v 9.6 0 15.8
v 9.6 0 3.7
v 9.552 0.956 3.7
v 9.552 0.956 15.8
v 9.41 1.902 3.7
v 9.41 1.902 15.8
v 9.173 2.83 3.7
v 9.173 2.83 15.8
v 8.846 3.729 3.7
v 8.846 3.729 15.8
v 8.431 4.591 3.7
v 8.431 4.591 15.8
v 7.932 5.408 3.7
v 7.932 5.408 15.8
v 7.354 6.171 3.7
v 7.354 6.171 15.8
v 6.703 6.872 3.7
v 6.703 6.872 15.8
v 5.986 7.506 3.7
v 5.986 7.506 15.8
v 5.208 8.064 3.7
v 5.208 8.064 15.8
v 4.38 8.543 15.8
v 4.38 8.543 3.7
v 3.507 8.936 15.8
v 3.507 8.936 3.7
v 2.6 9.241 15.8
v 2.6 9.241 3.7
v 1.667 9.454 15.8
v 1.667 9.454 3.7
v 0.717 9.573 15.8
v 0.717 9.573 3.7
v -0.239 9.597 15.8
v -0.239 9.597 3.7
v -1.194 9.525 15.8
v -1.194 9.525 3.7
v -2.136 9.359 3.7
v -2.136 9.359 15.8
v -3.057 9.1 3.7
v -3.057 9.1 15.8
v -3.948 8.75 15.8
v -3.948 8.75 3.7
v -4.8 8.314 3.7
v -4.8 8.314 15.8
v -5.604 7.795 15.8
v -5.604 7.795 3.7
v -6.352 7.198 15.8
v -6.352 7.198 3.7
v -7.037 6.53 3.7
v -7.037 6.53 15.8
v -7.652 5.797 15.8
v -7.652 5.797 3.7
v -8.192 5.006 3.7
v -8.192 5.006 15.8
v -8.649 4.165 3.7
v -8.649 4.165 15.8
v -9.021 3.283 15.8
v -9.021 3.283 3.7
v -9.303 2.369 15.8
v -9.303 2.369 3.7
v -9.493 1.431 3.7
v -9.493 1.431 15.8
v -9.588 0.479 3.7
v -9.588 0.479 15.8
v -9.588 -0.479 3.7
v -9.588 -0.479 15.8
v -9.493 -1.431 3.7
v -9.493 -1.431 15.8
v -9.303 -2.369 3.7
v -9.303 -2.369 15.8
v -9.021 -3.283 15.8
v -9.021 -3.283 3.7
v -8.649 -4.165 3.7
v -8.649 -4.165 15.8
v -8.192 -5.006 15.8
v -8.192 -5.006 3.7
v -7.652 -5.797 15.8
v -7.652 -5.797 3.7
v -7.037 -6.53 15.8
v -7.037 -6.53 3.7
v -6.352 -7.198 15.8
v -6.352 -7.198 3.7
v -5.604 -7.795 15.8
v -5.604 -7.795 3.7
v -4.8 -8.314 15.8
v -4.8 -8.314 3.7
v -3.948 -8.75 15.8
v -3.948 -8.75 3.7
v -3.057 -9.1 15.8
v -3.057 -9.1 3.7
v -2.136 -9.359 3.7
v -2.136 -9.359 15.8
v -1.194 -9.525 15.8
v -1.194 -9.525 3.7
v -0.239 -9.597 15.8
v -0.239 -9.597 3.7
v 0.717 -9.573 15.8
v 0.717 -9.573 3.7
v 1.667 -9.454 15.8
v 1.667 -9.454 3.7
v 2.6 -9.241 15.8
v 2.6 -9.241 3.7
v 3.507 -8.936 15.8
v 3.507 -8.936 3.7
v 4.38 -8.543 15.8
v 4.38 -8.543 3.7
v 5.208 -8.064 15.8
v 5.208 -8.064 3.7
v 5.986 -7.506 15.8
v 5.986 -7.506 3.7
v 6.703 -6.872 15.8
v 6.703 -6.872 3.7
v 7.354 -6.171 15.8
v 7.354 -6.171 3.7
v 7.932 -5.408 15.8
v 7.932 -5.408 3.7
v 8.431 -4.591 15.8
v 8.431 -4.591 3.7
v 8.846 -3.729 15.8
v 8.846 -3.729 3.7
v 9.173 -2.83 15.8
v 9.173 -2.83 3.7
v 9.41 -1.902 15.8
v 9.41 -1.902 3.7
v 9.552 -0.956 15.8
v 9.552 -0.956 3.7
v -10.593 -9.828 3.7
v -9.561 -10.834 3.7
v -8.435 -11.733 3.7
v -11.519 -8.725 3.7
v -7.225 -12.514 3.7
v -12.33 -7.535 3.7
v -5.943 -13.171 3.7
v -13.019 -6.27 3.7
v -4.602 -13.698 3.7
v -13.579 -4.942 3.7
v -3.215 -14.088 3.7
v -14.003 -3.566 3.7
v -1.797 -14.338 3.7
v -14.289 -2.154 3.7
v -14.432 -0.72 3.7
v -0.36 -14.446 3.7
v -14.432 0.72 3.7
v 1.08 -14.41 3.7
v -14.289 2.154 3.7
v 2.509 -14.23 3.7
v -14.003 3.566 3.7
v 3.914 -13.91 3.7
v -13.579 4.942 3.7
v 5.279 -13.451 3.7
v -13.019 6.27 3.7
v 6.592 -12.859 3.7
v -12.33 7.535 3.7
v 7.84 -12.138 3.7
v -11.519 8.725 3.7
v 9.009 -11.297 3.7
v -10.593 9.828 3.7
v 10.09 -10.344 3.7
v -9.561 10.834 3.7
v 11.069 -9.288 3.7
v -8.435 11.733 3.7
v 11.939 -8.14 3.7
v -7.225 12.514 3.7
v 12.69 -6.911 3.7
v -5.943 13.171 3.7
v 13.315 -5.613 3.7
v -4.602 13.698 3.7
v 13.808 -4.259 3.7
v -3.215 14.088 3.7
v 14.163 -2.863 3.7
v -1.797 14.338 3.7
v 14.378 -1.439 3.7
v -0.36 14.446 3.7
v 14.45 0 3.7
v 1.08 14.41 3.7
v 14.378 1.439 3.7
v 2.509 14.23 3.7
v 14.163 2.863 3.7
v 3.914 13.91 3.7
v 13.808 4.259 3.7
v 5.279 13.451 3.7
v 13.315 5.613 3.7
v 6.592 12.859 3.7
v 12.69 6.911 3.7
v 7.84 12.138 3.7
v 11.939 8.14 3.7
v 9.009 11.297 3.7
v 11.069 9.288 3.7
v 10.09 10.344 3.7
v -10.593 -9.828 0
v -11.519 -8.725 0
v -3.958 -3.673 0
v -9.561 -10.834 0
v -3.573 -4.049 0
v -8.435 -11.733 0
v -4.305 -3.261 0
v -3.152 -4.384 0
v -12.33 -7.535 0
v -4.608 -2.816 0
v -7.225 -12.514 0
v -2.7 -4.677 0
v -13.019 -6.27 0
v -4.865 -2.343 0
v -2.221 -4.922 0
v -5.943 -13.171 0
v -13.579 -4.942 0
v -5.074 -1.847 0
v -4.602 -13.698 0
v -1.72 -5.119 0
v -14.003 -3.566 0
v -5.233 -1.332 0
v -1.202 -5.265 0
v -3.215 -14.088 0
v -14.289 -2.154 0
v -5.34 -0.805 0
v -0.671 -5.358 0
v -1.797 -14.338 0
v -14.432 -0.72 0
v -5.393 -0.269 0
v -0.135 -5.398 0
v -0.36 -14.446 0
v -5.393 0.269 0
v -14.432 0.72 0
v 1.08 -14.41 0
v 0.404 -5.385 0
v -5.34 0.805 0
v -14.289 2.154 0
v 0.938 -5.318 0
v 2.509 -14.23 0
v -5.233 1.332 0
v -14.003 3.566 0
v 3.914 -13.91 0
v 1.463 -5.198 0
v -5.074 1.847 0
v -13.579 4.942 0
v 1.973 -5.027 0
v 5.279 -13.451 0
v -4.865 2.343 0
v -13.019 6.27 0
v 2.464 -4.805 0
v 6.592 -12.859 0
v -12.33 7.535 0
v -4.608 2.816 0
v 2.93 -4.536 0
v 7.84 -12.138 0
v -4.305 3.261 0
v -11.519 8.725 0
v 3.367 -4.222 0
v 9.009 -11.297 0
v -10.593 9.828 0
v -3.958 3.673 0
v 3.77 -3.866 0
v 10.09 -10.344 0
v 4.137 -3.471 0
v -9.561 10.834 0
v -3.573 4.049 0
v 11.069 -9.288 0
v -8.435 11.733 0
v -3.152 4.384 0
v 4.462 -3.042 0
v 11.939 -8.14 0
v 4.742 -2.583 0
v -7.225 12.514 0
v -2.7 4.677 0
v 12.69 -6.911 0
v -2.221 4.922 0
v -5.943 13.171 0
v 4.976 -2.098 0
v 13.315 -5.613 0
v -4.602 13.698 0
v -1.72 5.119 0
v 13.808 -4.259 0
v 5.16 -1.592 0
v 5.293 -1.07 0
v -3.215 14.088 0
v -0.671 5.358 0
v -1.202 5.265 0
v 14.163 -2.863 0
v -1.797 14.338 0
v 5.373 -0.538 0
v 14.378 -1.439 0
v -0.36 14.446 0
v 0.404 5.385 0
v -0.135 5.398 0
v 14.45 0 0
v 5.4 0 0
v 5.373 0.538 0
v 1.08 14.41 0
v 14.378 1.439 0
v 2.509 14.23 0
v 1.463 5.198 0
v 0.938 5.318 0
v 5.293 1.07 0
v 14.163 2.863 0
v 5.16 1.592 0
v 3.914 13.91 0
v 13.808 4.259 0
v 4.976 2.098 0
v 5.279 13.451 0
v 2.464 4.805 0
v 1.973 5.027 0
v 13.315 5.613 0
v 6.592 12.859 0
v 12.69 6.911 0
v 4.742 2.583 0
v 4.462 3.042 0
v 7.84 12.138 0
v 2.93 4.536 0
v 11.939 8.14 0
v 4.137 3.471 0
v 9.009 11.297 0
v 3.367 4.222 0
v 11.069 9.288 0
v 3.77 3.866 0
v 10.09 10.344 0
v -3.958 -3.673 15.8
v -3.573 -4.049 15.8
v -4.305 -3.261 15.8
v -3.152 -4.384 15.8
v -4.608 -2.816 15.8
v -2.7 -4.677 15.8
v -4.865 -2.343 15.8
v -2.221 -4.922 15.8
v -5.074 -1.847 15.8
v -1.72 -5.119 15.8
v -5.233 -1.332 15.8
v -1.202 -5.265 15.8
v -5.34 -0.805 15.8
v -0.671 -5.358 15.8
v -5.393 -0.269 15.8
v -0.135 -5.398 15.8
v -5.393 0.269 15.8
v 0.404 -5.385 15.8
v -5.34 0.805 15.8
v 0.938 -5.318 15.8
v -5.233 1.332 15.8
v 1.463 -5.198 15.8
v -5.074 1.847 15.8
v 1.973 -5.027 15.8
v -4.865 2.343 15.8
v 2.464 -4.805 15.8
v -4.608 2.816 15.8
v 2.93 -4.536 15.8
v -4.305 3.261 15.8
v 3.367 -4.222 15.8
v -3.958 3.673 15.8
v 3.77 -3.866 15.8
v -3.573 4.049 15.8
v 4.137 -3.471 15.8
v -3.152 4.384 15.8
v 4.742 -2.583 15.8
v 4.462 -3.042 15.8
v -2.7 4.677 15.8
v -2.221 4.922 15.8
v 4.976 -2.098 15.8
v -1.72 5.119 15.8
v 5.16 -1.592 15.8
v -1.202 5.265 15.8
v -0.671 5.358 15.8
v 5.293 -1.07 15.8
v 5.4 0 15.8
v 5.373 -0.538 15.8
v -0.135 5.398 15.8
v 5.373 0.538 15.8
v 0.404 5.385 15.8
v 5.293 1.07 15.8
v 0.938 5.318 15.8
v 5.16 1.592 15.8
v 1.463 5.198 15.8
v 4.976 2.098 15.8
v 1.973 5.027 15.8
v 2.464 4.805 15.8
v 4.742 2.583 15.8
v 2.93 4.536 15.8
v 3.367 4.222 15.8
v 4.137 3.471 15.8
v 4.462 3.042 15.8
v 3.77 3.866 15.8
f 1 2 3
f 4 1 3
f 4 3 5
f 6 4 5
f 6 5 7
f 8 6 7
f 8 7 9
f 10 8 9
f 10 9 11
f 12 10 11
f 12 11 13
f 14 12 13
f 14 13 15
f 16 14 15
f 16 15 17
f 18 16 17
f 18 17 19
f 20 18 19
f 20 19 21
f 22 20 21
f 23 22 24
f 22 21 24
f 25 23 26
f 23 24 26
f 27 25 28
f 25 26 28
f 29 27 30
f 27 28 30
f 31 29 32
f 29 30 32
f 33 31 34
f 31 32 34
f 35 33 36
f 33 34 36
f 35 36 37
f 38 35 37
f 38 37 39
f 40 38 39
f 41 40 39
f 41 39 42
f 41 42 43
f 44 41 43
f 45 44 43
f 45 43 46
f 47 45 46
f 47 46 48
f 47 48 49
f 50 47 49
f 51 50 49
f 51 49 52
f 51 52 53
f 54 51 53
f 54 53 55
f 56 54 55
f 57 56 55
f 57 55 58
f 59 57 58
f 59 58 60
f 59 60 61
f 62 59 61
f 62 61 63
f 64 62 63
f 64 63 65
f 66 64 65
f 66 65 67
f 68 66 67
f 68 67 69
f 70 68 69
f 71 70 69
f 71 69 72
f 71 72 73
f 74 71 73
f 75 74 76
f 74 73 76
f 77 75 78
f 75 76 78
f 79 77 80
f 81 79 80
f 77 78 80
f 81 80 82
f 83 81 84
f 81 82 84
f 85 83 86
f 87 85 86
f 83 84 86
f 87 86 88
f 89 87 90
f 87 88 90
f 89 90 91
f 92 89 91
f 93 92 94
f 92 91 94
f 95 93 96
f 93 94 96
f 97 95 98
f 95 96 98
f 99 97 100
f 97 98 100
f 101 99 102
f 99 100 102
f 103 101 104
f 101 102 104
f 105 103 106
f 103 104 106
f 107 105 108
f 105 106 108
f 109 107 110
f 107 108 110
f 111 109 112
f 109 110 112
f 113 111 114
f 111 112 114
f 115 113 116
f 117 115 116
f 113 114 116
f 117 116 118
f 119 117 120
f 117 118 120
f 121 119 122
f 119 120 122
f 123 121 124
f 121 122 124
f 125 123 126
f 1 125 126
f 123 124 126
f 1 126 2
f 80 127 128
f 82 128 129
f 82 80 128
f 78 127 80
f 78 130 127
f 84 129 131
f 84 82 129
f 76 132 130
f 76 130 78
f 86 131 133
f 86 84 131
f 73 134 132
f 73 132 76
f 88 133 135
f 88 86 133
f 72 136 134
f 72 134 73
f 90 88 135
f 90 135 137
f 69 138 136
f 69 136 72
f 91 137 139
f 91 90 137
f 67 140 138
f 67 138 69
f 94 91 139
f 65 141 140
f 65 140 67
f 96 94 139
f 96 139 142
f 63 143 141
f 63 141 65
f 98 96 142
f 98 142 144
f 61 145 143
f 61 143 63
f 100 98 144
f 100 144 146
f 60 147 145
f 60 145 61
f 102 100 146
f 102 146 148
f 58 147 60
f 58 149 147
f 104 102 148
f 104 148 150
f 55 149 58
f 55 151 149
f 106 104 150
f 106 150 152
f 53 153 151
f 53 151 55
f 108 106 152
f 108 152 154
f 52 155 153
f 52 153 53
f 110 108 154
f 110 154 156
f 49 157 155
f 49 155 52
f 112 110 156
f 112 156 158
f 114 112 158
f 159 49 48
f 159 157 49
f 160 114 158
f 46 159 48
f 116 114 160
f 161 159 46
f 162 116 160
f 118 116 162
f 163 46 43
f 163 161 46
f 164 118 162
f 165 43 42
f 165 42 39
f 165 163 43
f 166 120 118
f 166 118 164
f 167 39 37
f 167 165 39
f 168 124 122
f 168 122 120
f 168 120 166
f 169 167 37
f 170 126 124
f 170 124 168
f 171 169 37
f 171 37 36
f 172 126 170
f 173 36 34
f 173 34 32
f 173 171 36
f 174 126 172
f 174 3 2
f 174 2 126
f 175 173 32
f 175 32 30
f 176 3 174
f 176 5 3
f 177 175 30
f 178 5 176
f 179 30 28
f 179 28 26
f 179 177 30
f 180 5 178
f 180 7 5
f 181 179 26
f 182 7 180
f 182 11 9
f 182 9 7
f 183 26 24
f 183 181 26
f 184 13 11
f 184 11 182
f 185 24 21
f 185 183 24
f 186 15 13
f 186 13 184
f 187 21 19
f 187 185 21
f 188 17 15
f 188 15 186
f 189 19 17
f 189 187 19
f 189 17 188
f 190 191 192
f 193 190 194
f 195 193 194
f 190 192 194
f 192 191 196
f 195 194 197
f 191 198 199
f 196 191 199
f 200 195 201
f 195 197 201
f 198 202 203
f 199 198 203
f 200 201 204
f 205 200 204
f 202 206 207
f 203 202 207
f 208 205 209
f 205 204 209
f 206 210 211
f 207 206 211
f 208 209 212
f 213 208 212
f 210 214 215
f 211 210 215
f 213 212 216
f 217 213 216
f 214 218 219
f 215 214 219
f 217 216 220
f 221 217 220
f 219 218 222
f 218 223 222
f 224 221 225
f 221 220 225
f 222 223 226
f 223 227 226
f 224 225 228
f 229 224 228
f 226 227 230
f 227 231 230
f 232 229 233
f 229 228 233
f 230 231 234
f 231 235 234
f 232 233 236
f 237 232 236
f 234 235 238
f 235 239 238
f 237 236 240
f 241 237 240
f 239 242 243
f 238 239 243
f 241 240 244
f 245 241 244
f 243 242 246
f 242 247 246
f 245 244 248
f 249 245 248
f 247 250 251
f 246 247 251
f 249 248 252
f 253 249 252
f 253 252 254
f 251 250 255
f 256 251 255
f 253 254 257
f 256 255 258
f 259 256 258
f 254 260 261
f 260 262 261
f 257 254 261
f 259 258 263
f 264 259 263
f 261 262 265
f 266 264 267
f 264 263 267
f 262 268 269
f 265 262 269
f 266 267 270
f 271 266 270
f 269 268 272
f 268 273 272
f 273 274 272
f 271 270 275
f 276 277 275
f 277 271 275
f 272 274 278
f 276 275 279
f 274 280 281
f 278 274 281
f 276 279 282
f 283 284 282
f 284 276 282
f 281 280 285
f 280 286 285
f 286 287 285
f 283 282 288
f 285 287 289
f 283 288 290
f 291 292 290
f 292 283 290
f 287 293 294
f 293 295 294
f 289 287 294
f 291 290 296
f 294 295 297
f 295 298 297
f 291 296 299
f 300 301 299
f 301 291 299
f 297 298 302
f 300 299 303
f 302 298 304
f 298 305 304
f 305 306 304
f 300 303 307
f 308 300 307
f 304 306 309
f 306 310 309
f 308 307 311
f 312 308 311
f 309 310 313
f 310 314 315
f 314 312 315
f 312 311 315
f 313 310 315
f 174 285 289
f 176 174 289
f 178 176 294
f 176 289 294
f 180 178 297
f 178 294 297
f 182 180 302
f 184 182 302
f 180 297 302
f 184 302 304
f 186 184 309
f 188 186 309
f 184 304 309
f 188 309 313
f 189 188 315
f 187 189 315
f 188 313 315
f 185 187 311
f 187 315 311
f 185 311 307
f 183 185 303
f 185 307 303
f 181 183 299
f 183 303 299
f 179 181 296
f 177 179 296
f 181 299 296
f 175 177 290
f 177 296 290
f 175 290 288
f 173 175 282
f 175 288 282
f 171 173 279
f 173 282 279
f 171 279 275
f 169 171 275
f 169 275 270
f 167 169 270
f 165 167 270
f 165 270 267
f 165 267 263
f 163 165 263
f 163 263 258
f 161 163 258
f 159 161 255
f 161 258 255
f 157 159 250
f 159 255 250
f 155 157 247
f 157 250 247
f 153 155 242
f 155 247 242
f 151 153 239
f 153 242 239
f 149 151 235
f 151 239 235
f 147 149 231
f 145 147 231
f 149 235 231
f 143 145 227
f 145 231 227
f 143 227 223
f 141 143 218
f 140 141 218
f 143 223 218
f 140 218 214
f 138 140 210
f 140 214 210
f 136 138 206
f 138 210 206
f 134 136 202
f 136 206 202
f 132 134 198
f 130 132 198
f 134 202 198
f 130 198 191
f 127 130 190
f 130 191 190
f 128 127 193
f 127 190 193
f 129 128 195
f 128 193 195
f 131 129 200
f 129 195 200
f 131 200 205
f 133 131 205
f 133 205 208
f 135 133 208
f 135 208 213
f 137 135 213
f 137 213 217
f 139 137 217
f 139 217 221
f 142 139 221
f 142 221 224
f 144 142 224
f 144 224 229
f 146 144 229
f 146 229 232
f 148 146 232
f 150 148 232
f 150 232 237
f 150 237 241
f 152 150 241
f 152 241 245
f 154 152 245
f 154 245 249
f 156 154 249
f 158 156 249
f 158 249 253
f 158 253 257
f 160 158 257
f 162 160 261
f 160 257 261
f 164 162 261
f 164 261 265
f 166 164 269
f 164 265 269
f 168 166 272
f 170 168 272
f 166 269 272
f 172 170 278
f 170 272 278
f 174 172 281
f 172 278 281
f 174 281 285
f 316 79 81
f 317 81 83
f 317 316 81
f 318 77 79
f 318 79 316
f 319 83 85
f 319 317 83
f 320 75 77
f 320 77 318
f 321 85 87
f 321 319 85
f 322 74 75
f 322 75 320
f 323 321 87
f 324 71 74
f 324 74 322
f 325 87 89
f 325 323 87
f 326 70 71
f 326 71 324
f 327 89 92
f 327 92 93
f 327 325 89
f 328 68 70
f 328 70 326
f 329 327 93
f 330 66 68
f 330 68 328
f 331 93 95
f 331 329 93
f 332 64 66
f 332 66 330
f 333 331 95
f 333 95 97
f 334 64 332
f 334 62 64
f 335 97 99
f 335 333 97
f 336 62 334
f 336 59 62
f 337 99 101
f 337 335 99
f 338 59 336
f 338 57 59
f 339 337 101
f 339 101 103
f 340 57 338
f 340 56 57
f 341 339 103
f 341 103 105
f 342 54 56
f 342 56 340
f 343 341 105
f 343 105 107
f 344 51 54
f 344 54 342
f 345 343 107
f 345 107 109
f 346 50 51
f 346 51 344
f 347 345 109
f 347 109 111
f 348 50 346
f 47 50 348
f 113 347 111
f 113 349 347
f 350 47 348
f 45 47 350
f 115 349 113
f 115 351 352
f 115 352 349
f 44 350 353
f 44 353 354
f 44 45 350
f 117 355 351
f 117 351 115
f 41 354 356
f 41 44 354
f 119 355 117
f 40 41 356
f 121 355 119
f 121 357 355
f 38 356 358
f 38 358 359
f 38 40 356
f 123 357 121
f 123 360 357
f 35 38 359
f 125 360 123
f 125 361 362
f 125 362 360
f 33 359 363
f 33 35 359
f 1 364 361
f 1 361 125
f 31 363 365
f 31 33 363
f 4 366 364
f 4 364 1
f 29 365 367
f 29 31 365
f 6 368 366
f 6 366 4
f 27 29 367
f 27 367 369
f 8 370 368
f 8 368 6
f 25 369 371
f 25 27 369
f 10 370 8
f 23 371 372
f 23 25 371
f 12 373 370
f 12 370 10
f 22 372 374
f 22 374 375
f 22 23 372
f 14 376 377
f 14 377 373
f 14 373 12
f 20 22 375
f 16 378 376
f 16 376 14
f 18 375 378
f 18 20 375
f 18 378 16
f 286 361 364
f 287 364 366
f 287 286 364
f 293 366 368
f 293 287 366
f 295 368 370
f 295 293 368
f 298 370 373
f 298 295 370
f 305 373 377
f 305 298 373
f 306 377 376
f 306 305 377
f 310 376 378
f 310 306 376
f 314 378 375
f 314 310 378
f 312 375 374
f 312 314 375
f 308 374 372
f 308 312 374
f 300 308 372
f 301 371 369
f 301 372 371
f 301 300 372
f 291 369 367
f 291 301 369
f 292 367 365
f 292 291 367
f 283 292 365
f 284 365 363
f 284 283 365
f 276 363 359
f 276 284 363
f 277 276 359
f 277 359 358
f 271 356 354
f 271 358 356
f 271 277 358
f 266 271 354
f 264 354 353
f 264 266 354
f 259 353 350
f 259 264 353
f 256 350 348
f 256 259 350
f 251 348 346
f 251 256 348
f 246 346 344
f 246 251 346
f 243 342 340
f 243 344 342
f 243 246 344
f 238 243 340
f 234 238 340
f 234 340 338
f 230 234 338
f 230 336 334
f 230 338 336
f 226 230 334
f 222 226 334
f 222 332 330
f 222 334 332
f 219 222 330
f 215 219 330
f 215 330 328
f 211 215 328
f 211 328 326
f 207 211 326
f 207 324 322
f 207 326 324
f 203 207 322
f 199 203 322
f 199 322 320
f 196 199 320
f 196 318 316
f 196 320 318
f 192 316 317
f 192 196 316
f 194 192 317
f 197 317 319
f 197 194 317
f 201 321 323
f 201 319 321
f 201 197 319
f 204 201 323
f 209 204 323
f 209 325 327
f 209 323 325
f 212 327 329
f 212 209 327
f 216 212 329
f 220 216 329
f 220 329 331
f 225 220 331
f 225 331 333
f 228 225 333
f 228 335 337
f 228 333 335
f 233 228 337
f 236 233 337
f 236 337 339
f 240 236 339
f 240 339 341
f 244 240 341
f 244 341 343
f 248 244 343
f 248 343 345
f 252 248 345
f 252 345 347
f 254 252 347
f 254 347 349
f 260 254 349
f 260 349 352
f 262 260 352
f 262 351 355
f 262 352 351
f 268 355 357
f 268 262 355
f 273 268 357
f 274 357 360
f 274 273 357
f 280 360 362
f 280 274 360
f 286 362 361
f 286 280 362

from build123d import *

# Parameters (mm, degrees)
F0_R     = 9.6
F1_DEPTH = 15.8
F2_R     = 5.4
F3_DEPTH = 20
F4_R     = 14.45
F5_DEPTH = 3.7
F6_R     = 5.4
F7_DEPTH = 3.7


with BuildPart() as f1:
    # F0 (on Top) → F1 (new body)
    with BuildSketch(Plane.XY):
        Circle(F0_R)
    extrude(amount=F1_DEPTH)

    # F2 (on Top) → F3 (cut)
    with BuildSketch(Plane.XY):
        Circle(F2_R)
    extrude(amount=F3_DEPTH, mode=Mode.SUBTRACT)

    # F4 (on Top) → F5 (join)
    with BuildSketch(Plane.XY):
        Circle(F4_R)
    extrude(amount=F5_DEPTH)

    # F6 (on Top) → F7 (cut)
    with BuildSketch(Plane.XY):
        Circle(F6_R)
    extrude(amount=F7_DEPTH, mode=Mode.SUBTRACT)


solid = f1.part
